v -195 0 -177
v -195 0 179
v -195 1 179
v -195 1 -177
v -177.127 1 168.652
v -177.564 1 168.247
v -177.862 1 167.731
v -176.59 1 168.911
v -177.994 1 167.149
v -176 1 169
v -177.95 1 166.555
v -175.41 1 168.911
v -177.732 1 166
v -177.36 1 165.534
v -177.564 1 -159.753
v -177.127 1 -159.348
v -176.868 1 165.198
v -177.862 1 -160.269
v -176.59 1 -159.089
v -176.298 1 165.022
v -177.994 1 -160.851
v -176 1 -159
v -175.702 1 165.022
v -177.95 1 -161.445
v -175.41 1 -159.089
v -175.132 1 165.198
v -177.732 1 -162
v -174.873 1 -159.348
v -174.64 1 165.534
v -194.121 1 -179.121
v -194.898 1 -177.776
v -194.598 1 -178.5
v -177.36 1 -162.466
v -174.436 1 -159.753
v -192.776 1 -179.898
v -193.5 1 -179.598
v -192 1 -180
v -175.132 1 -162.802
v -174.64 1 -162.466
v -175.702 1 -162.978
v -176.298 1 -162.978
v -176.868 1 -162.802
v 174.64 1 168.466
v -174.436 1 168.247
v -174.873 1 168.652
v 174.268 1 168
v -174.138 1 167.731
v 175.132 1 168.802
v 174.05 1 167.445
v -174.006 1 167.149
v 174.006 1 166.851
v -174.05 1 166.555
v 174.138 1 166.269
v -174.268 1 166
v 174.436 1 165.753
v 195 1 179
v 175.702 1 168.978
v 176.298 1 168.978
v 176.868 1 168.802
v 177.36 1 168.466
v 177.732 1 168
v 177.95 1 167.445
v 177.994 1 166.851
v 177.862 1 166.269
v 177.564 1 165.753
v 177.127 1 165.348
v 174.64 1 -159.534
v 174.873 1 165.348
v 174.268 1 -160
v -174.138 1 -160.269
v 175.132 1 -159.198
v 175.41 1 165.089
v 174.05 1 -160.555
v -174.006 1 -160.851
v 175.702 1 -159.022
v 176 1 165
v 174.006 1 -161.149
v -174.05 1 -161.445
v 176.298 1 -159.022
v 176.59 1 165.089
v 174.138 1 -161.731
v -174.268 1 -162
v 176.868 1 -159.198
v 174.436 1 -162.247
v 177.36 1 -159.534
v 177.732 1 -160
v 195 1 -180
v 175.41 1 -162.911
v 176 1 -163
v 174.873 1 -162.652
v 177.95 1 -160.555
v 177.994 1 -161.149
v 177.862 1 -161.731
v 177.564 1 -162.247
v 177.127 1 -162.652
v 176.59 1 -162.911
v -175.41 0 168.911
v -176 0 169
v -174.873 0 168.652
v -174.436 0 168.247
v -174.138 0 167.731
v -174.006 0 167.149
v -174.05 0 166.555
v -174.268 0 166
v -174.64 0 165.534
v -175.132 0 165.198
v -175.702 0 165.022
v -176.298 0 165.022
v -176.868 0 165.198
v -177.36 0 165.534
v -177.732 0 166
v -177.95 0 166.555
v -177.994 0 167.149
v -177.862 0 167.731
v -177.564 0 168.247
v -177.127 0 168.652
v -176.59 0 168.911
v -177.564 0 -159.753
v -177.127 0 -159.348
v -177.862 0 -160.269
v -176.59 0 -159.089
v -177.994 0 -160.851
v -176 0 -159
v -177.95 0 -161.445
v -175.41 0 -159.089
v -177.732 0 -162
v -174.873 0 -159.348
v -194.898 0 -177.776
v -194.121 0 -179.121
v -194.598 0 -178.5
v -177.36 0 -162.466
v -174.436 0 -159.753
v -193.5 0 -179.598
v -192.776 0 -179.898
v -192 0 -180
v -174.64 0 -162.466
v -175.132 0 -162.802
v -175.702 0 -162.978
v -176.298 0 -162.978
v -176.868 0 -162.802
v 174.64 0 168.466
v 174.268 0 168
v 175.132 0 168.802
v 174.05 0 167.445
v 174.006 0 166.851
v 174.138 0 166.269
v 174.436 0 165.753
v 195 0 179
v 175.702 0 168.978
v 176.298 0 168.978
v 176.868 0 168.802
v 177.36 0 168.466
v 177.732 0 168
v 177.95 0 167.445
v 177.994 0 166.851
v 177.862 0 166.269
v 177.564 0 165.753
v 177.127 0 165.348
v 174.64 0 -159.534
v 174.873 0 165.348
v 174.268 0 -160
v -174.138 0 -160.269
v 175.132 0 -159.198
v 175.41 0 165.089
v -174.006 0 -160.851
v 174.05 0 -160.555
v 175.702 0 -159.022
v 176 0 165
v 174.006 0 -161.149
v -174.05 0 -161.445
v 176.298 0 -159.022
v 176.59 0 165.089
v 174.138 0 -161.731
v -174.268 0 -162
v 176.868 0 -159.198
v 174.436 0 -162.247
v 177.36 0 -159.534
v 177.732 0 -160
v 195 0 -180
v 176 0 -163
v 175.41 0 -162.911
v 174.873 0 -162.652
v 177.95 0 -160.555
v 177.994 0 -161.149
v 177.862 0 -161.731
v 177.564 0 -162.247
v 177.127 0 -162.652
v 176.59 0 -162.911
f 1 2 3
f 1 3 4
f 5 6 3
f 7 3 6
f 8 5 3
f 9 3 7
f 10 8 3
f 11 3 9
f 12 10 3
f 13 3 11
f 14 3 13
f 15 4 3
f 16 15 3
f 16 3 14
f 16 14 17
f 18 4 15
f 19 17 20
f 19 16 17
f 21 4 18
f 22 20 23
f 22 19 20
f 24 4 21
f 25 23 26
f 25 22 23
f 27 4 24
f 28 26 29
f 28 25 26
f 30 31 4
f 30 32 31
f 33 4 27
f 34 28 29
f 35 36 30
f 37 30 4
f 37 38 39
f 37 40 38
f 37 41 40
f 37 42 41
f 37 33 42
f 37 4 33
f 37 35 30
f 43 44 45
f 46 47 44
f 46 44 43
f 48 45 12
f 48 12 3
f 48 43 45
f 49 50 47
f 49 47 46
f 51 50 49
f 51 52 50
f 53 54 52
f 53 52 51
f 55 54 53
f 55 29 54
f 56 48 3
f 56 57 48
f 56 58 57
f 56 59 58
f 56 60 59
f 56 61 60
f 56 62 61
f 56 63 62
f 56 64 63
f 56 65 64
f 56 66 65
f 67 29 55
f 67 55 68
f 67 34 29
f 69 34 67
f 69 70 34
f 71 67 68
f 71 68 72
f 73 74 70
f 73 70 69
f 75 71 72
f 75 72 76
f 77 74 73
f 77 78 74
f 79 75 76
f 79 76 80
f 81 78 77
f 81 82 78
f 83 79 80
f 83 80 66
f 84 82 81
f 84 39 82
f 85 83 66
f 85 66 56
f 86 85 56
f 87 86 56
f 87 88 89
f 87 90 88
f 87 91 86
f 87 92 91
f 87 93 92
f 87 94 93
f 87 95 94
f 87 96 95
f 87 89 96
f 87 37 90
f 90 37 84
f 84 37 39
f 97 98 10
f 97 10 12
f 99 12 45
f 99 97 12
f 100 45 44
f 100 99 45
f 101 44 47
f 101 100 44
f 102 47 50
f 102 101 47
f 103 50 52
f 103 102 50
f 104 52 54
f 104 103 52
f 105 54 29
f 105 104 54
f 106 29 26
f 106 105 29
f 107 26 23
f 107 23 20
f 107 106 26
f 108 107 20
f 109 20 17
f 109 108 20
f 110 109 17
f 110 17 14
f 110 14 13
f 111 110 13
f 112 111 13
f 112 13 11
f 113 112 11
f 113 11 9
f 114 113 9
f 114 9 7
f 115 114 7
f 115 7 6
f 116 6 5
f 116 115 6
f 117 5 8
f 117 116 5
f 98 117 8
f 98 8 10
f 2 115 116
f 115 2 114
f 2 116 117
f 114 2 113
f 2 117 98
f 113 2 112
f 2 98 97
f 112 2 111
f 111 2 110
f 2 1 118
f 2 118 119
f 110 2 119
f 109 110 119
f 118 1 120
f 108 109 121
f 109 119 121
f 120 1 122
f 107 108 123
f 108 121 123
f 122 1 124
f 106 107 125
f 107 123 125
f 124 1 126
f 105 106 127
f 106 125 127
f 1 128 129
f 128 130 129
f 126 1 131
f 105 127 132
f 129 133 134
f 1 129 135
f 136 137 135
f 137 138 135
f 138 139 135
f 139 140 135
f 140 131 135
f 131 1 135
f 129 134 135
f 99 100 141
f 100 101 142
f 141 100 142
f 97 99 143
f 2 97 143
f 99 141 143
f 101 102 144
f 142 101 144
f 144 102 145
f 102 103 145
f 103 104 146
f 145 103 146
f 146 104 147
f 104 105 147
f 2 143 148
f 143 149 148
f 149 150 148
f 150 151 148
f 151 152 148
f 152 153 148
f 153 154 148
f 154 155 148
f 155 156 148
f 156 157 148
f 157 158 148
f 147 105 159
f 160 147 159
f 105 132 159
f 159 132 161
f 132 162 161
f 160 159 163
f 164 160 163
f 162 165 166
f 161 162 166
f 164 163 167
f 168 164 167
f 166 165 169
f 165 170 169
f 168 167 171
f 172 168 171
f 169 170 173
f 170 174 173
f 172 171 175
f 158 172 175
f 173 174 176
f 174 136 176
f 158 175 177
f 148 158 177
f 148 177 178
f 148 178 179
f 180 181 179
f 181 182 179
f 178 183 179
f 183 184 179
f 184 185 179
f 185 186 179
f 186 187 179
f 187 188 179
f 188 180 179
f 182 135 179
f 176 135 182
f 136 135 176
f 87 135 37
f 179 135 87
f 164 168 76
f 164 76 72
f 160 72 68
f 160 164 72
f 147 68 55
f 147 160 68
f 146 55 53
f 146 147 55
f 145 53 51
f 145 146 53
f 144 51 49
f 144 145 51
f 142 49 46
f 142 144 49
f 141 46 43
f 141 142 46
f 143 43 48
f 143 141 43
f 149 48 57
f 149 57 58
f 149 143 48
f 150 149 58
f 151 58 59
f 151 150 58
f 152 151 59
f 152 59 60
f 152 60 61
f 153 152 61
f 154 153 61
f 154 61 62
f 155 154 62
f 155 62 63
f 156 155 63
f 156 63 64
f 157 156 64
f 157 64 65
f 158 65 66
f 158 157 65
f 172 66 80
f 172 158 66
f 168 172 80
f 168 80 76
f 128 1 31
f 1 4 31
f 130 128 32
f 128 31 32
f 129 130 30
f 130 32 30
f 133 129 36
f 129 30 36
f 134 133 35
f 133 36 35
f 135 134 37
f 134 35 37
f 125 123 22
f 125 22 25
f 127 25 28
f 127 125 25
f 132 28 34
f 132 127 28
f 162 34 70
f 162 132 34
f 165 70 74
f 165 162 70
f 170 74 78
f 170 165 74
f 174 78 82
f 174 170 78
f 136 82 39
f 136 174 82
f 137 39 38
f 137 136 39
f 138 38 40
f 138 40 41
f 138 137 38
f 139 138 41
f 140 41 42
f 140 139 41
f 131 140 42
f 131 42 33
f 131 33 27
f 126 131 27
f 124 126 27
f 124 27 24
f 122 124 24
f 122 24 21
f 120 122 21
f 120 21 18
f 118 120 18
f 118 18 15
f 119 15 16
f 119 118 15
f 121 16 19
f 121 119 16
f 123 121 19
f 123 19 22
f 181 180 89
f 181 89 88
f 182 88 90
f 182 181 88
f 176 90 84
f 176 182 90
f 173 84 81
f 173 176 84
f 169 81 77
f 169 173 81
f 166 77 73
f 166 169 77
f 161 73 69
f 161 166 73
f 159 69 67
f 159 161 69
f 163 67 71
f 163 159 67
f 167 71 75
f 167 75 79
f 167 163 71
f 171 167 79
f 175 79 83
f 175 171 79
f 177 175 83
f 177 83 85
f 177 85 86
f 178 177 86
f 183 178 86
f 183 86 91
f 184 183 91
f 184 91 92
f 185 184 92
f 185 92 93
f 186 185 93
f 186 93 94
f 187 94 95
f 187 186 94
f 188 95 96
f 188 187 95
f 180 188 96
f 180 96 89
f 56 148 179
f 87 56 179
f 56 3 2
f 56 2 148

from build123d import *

# Parameters (mm, degrees)
SKETCH1_W           = 390
SKETCH1_H           = 360
SKETCH1_R           = 2
BOSS_EXTRUDE1_DEPTH = 1
FILLET1_R           = 3
SKETCH2_W           = 390
SKETCH2_H           = 1
CUT_EXTRUDE1_DEPTH  = 266.378974299


with BuildPart() as part:
    # Sketch1 → Boss-Extrude1 (new body)
    with BuildSketch(Plane(origin=(0, 0, 0), x_dir=(1, 0, 0), z_dir=(0, 1, 0))):
        Rectangle(SKETCH1_W, SKETCH1_H)
        with Locations(Location((-176, -167, 0), (0, 0, 270))):
            Circle(SKETCH1_R, mode=Mode.SUBTRACT)
        with Locations(Location((-176, 161, 0), (0, 0, 270))):
            Circle(SKETCH1_R, mode=Mode.SUBTRACT)
        with Locations(Location((176, 161, 0), (0, 0, 90))):
            Circle(SKETCH1_R, mode=Mode.SUBTRACT)
        with Locations(Location((176, -167, 0), (0, 0, 90))):
            Circle(SKETCH1_R, mode=Mode.SUBTRACT)
    extrude(amount=BOSS_EXTRUDE1_DEPTH)

    # Fillet1
    fillet1_edges = [part.edges().sort_by_distance(p)[0] for p in [
        (-195, 0.5, -180),
    ]]
    fillet(fillet1_edges, radius=FILLET1_R)

    # Sketch2 → Cut-Extrude1 (cut, through all)
    with BuildSketch(Plane(origin=(0, 1, 0), x_dir=(1, 0, 0), z_dir=(0, 1, 0))):
        with Locations((0, -179.5)):
            Rectangle(SKETCH2_W, SKETCH2_H)
    extrude(amount=-CUT_EXTRUDE1_DEPTH, mode=Mode.SUBTRACT)


solid = part.part
